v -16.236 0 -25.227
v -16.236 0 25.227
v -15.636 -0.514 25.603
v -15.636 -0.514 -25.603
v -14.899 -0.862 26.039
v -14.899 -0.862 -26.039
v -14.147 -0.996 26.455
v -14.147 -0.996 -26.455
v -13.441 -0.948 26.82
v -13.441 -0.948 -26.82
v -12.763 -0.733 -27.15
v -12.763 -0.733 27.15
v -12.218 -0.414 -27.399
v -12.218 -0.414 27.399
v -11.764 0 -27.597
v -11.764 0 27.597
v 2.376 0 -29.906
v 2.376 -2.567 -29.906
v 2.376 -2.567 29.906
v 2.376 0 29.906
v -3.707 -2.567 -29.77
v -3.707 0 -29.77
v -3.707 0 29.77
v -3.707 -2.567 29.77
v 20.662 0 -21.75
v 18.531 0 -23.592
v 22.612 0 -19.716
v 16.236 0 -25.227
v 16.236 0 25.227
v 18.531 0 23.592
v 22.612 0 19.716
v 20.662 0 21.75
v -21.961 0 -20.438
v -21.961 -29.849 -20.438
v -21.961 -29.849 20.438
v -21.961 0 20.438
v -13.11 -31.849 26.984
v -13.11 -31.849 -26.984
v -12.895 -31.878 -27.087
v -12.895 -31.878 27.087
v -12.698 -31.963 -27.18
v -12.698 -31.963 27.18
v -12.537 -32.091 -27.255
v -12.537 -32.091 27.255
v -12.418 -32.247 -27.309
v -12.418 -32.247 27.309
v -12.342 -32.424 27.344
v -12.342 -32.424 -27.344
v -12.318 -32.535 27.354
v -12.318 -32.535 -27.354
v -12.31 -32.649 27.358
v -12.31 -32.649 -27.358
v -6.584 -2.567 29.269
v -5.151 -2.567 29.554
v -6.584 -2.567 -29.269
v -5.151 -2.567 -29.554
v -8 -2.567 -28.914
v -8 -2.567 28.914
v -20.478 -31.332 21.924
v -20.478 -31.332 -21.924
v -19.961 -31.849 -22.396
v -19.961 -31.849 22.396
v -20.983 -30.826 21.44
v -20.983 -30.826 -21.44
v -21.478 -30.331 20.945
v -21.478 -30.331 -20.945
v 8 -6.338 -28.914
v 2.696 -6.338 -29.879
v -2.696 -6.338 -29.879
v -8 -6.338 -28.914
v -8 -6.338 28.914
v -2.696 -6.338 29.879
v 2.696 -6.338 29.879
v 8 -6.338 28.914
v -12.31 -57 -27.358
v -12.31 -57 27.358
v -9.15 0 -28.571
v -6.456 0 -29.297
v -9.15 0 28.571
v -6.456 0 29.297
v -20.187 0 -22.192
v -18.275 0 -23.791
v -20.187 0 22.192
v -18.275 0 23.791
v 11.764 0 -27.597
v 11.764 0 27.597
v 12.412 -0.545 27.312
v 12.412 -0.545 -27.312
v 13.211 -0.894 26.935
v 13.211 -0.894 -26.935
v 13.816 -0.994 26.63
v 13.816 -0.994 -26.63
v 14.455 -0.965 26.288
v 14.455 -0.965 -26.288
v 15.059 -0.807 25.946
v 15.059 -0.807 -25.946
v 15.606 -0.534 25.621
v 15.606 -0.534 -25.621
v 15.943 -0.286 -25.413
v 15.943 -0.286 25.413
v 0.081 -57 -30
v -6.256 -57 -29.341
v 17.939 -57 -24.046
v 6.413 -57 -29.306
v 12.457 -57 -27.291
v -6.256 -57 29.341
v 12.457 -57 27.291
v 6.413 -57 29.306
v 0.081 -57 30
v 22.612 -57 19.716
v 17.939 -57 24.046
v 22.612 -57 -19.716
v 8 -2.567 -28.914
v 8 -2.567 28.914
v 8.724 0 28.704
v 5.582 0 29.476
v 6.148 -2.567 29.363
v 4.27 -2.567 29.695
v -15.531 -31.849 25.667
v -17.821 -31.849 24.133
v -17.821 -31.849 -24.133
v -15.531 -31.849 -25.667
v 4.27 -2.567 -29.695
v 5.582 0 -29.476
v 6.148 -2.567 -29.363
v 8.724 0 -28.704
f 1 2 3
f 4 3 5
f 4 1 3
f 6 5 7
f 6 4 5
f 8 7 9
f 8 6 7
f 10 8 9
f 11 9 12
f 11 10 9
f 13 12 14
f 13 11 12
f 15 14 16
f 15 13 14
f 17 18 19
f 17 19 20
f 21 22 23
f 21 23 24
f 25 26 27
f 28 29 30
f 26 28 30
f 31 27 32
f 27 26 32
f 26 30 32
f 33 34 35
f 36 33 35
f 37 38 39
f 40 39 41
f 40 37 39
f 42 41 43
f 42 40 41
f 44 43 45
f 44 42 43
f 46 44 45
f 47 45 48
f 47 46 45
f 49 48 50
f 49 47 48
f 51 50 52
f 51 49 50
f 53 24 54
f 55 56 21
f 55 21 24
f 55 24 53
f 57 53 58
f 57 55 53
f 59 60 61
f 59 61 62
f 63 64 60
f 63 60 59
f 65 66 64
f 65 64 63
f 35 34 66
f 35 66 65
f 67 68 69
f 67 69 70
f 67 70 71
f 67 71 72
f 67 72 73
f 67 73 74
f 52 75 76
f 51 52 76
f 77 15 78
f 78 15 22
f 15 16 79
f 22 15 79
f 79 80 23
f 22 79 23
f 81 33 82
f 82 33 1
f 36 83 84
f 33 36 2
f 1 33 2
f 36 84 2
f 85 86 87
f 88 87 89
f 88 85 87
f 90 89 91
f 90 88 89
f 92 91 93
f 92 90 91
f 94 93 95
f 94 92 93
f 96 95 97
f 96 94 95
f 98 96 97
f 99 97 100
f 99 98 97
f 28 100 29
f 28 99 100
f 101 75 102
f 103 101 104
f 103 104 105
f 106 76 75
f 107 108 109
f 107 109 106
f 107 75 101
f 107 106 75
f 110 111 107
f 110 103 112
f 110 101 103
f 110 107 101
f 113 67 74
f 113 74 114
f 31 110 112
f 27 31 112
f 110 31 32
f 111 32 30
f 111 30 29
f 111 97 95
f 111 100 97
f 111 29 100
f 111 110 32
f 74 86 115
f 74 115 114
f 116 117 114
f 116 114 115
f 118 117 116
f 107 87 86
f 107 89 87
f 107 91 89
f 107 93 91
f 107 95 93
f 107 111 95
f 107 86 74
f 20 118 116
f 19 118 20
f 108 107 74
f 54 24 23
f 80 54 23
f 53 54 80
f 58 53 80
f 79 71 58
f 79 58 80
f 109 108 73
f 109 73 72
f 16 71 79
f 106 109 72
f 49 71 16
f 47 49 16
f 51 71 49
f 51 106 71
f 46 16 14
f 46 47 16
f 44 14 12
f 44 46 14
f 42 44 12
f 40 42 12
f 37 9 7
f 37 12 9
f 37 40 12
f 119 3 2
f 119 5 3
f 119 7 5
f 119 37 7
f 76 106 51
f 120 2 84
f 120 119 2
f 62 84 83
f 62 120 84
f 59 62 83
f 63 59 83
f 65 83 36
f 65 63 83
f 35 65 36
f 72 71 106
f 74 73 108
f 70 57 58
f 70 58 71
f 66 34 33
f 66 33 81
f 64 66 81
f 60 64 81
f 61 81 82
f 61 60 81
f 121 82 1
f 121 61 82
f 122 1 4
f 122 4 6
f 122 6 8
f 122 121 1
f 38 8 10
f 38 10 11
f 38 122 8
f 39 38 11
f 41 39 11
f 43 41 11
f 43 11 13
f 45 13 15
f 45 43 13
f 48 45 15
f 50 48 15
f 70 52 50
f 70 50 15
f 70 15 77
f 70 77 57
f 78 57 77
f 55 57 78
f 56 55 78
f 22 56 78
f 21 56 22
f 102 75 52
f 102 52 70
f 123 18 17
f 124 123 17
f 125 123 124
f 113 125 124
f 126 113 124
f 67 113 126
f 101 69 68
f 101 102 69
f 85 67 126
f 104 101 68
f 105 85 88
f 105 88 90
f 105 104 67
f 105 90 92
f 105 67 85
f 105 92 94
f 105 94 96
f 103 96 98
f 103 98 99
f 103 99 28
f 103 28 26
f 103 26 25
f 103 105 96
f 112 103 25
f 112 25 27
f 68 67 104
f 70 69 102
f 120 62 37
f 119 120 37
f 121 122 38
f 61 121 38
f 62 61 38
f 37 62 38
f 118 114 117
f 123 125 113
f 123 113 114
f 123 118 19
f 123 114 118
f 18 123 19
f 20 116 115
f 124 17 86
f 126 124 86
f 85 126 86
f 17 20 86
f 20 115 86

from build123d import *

# Parameters (mm, degrees)
F0_R           = 30
F1_DEPTH       = 65
F3_DEPTH       = 100
F5_DEPTH       = 30.001
F6_DEPTH       = 30.001
F7_W           = 15.4366167262
F7_H           = 36.5562289953
F8_DEPTH       = 30.001
F9_DEPTH       = 30.001
F10_SIZE       = 2
F11_R          = 0.8
F12_R          = 3
F13_DEPTH      = 30.0010001
F13_DEPTH_BACK = 40
F14_DEPTH      = 8
F15_DEPTH      = 8
F16_DEPTH      = 8


with BuildPart() as f1:
    # F0 (on Front) → F1 (new body)
    with BuildSketch(Plane.XZ):
        Circle(F0_R)
    extrude(amount=F1_DEPTH)

    # F2 (on face) → F3 (cut)
    with BuildSketch(Plane.XZ.offset(65)):
        Polygon((-21.9606160964, -36.838453263), (-21.9606160964, 0), (-21.9606160964, 35.5276139707), (-38.4832583368, 35.5276139707), (-38.4832583368, -36.838453263), align=None)
        Polygon((48.3217574656, 35.5276139707), (22.611644119, 35.5276139707), (22.611644119, -36.6470105946), (22.611644119, -36.838453263), (48.3217574656, -36.838453263), align=None)
    extrude(amount=-F3_DEPTH, mode=Mode.SUBTRACT)

    # F4 (on Top) → F5 (cut, through all)
    with BuildSketch(Plane.XY):
        Polygon((-3.7071546579, 1.4132426067), (-3.7071546579, 0), (-3.7071546579, -2.5668929264), (-8, -2.5668929264), (-8, -6.3375936387), (8, -6.3375936387), (8, -2.5668929264), (2.3758972687, -2.5668929264), (2.3758972687, 0), (2.3758972687, 1.4132426067), align=None)
    extrude(amount=F5_DEPTH, mode=Mode.SUBTRACT)

    # F4 (on Top) → F6 (cut, through all)
    with BuildSketch(Plane.XY):
        Polygon((-3.7071546579, 1.4132426067), (-3.7071546579, 0), (-3.7071546579, -2.5668929264), (-8, -2.5668929264), (-8, -6.3375936387), (8, -6.3375936387), (8, -2.5668929264), (2.3758972687, -2.5668929264), (2.3758972687, 0), (2.3758972687, 1.4132426067), align=None)
    extrude(amount=-F6_DEPTH, mode=Mode.SUBTRACT)

    # F7 (on Top) → F8 (cut, through all)
    with BuildSketch(Plane.XY):
        with Locations((-20.028361585, -50.1266494393)):
            Rectangle(F7_W, F7_H)
    extrude(amount=-F8_DEPTH, mode=Mode.SUBTRACT)

    # F7 (on Top) → F9 (cut, through all)
    with BuildSketch(Plane.XY):
        with Locations((-20.028361585, -50.1266494393)):
            Rectangle(F7_W, F7_H)
    extrude(amount=F9_DEPTH, mode=Mode.SUBTRACT)

    # F10
    f10_edges = [f1.edges().sort_by_distance(p)[0] for p in [
        (-21.960616, -31.848535, 0),
    ]]
    chamfer(f10_edges, length=F10_SIZE)

    # F11
    f11_edges = [f1.edges().sort_by_distance(p)[0] for p in [
        (-12.310053, -31.848535, 0),
    ]]
    fillet(f11_edges, radius=F11_R)

    # F12 (on Top) → F13 (cut, two sides)
    with BuildSketch(Plane.XY) as f13_sk:
        with Locations((-14, 2)):
            Circle(F12_R)
        with Locations((14, 2)):
            Circle(F12_R)
    extrude(amount=F13_DEPTH, mode=Mode.SUBTRACT)
    extrude(f13_sk.sketch, amount=-F13_DEPTH_BACK, mode=Mode.SUBTRACT)

    # F14 (add): a face of the model
    f14_faces = [f1.faces().sort_by_distance(p)[0] for p in [
        (4.422443075, -65, 0),
    ]]
    extrude(f14_faces, amount=-F14_DEPTH)

    # F15 (add): a face of the model
    f15_faces = [f1.faces().sort_by_distance(p)[0] for p in [
        (4.422443075, -65, 0),
    ]]
    extrude(f15_faces, amount=-F15_DEPTH)

    # F16 (cut): a face of the model
    f16_faces = [f1.faces().sort_by_distance(p)[0] for p in [
        (4.422443075, -65, 0),
    ]]
    extrude(f16_faces, amount=-F16_DEPTH, mode=Mode.SUBTRACT)


solid = f1.part
